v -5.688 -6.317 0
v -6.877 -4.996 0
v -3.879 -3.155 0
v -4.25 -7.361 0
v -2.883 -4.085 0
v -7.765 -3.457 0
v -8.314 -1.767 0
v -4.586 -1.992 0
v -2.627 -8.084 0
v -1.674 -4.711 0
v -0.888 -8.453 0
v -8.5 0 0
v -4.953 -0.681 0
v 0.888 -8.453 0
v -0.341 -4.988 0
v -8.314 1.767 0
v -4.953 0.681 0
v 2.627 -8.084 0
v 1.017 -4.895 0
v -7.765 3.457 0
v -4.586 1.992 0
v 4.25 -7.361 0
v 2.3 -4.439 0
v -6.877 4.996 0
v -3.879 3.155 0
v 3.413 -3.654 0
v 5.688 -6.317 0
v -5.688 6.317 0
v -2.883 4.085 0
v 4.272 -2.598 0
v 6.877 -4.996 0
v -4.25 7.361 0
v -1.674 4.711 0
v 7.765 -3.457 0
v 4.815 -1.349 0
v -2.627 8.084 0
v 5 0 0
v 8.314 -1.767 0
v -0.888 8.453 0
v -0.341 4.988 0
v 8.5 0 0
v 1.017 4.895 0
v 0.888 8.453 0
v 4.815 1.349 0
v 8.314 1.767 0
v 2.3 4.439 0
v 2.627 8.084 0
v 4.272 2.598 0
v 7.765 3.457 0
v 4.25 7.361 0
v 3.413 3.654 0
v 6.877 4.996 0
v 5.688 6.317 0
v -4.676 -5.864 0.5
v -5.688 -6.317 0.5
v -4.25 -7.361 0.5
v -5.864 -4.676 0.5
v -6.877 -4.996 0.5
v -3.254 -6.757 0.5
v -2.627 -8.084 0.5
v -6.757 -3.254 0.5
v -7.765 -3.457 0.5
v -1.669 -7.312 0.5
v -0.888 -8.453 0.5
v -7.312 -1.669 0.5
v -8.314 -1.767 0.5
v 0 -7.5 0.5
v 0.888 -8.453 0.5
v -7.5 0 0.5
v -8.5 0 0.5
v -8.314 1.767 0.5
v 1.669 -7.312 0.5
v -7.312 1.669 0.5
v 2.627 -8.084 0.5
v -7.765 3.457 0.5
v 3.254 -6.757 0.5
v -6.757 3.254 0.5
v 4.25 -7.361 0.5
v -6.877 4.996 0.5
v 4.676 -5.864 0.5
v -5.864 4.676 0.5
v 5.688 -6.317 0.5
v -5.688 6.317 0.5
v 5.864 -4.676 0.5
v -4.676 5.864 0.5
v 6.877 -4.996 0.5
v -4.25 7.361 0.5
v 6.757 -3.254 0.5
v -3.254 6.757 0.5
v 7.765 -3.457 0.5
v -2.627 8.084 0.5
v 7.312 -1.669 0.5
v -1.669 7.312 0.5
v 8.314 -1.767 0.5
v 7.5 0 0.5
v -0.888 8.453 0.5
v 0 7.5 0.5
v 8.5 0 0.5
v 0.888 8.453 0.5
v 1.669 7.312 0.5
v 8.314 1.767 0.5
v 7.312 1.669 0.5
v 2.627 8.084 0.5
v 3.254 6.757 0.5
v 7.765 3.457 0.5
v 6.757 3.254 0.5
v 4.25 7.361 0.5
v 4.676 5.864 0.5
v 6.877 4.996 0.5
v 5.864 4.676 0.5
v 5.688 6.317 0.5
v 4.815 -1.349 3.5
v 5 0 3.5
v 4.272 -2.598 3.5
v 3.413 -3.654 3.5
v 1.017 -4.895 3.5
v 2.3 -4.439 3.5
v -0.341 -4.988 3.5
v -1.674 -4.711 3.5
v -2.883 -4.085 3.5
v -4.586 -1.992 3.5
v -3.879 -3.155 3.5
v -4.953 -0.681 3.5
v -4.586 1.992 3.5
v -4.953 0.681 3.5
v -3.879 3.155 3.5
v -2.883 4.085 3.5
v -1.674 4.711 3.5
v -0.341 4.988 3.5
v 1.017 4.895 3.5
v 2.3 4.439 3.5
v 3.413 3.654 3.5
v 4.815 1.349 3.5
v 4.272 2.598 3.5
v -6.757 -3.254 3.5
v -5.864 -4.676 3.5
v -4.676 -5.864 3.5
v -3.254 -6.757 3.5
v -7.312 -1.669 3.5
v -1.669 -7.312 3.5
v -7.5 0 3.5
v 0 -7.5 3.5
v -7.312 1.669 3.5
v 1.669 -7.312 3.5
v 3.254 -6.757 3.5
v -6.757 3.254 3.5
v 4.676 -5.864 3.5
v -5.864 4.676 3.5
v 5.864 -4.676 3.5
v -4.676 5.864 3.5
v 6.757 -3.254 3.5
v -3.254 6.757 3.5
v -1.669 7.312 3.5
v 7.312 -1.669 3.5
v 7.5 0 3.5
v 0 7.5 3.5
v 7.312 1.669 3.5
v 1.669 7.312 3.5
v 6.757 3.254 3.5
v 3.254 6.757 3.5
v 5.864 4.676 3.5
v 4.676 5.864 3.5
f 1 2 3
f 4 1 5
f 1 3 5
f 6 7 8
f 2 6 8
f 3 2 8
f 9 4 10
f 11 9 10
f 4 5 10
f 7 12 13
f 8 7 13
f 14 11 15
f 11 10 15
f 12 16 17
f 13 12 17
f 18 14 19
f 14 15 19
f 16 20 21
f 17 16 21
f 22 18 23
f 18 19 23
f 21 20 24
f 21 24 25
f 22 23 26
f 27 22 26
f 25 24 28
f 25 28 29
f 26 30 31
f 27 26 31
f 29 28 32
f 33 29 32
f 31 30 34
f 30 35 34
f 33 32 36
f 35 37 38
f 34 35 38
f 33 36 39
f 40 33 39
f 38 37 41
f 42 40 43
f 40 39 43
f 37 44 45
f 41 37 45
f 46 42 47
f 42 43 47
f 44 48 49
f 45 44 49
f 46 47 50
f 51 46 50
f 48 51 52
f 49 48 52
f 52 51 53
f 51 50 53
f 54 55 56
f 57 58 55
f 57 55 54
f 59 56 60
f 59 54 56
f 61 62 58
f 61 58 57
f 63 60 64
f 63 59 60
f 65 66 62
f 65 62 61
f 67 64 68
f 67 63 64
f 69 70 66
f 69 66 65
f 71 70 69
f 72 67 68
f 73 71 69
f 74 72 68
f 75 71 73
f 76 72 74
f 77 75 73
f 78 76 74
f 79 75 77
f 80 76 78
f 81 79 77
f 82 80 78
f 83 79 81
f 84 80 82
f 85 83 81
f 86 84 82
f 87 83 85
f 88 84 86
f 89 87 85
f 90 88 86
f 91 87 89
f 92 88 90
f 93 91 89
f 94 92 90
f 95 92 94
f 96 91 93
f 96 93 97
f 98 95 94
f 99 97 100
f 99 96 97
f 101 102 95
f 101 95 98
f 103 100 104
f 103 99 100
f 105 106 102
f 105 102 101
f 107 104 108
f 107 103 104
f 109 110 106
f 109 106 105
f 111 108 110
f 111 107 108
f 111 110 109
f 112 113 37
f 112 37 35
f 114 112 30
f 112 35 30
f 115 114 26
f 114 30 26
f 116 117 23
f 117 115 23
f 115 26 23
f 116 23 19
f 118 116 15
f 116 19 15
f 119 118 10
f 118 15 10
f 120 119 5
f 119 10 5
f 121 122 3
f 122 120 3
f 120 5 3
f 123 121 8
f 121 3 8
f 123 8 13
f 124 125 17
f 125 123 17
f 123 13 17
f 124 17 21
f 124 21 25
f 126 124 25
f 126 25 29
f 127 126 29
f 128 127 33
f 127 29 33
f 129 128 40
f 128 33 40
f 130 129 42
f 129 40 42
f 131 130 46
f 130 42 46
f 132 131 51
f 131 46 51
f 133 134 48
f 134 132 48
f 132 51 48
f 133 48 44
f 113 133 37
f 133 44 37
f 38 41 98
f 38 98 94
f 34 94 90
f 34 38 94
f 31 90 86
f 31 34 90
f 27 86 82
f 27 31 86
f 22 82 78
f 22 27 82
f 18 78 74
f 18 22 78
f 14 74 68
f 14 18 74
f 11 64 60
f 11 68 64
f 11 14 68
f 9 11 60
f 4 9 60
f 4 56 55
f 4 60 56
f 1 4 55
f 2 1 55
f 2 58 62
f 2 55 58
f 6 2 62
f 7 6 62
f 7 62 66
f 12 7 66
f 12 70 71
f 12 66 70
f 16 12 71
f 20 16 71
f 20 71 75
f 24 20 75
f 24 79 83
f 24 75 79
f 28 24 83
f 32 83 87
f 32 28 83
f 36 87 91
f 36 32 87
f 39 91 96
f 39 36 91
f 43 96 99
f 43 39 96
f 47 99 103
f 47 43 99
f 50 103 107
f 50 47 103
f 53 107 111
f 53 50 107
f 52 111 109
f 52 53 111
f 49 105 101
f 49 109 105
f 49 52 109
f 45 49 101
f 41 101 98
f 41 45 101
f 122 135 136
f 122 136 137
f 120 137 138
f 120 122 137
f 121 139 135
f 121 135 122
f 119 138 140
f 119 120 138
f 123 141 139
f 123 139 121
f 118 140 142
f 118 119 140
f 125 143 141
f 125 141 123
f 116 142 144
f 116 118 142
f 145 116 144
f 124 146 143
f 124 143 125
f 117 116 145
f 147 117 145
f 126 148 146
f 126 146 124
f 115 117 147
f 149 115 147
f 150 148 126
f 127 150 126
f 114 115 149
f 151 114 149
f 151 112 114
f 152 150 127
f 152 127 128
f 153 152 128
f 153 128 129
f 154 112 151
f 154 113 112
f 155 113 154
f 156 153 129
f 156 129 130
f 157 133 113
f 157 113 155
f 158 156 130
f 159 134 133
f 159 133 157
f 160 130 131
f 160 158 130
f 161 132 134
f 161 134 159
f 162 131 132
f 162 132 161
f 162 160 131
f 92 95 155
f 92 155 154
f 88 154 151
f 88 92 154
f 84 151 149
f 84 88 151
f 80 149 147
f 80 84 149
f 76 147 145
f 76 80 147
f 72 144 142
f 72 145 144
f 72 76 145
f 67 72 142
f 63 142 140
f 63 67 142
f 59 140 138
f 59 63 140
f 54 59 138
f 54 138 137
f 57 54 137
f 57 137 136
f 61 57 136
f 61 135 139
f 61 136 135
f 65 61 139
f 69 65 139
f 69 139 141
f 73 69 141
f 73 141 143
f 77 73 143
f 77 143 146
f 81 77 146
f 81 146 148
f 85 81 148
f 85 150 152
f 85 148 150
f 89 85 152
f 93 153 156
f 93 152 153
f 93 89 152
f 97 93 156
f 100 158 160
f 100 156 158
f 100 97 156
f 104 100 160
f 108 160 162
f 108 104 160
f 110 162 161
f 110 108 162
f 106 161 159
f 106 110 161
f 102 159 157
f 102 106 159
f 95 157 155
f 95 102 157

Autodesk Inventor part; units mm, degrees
ref_plane "YZ Plane" through (0, 0, 0) normal (1, 0, 0) x (0, 1, 0)
ref_plane "XZ Plane" through (0, 0, 0) normal (0, 1, 0) x (-1, 0, 0)
ref_plane "XY Plane" through (0, 0, 0) normal (0, 0, 1) x (1, 0, 0)
sketch "スケッチ1" plane through (0, 0, 0) normal (0, 0, 1) x (1, 0, 0)
  circle A0 centre (0, 0) radius 5
  circle A1 centre (0, 0) radius 8.5
  dimension "d0" = 10
  dimension "d1" = 17
extrude "押し出し1" add sketch "スケッチ1" along normal blind 0.5
sketch "スケッチ2" plane through (0, 0, 0.5) normal (0, 0, 1) x (1, 0, 0)
  circle A0 centre (0, 0) radius 7.5
  dimension "d4" = 15
extrude "押し出し2" add sketch "スケッチ2" along normal blind 3
sketch "スケッチ3" plane through (0, 0, 3.5) normal (0, 0, 1) x (1, 0, 0)
  circle A0 centre (0, 0) radius 5
  dimension "d7" = 10
extrude "押し出し3" cut sketch "スケッチ3" against normal blind 5
properties part number "bearing10-15"
